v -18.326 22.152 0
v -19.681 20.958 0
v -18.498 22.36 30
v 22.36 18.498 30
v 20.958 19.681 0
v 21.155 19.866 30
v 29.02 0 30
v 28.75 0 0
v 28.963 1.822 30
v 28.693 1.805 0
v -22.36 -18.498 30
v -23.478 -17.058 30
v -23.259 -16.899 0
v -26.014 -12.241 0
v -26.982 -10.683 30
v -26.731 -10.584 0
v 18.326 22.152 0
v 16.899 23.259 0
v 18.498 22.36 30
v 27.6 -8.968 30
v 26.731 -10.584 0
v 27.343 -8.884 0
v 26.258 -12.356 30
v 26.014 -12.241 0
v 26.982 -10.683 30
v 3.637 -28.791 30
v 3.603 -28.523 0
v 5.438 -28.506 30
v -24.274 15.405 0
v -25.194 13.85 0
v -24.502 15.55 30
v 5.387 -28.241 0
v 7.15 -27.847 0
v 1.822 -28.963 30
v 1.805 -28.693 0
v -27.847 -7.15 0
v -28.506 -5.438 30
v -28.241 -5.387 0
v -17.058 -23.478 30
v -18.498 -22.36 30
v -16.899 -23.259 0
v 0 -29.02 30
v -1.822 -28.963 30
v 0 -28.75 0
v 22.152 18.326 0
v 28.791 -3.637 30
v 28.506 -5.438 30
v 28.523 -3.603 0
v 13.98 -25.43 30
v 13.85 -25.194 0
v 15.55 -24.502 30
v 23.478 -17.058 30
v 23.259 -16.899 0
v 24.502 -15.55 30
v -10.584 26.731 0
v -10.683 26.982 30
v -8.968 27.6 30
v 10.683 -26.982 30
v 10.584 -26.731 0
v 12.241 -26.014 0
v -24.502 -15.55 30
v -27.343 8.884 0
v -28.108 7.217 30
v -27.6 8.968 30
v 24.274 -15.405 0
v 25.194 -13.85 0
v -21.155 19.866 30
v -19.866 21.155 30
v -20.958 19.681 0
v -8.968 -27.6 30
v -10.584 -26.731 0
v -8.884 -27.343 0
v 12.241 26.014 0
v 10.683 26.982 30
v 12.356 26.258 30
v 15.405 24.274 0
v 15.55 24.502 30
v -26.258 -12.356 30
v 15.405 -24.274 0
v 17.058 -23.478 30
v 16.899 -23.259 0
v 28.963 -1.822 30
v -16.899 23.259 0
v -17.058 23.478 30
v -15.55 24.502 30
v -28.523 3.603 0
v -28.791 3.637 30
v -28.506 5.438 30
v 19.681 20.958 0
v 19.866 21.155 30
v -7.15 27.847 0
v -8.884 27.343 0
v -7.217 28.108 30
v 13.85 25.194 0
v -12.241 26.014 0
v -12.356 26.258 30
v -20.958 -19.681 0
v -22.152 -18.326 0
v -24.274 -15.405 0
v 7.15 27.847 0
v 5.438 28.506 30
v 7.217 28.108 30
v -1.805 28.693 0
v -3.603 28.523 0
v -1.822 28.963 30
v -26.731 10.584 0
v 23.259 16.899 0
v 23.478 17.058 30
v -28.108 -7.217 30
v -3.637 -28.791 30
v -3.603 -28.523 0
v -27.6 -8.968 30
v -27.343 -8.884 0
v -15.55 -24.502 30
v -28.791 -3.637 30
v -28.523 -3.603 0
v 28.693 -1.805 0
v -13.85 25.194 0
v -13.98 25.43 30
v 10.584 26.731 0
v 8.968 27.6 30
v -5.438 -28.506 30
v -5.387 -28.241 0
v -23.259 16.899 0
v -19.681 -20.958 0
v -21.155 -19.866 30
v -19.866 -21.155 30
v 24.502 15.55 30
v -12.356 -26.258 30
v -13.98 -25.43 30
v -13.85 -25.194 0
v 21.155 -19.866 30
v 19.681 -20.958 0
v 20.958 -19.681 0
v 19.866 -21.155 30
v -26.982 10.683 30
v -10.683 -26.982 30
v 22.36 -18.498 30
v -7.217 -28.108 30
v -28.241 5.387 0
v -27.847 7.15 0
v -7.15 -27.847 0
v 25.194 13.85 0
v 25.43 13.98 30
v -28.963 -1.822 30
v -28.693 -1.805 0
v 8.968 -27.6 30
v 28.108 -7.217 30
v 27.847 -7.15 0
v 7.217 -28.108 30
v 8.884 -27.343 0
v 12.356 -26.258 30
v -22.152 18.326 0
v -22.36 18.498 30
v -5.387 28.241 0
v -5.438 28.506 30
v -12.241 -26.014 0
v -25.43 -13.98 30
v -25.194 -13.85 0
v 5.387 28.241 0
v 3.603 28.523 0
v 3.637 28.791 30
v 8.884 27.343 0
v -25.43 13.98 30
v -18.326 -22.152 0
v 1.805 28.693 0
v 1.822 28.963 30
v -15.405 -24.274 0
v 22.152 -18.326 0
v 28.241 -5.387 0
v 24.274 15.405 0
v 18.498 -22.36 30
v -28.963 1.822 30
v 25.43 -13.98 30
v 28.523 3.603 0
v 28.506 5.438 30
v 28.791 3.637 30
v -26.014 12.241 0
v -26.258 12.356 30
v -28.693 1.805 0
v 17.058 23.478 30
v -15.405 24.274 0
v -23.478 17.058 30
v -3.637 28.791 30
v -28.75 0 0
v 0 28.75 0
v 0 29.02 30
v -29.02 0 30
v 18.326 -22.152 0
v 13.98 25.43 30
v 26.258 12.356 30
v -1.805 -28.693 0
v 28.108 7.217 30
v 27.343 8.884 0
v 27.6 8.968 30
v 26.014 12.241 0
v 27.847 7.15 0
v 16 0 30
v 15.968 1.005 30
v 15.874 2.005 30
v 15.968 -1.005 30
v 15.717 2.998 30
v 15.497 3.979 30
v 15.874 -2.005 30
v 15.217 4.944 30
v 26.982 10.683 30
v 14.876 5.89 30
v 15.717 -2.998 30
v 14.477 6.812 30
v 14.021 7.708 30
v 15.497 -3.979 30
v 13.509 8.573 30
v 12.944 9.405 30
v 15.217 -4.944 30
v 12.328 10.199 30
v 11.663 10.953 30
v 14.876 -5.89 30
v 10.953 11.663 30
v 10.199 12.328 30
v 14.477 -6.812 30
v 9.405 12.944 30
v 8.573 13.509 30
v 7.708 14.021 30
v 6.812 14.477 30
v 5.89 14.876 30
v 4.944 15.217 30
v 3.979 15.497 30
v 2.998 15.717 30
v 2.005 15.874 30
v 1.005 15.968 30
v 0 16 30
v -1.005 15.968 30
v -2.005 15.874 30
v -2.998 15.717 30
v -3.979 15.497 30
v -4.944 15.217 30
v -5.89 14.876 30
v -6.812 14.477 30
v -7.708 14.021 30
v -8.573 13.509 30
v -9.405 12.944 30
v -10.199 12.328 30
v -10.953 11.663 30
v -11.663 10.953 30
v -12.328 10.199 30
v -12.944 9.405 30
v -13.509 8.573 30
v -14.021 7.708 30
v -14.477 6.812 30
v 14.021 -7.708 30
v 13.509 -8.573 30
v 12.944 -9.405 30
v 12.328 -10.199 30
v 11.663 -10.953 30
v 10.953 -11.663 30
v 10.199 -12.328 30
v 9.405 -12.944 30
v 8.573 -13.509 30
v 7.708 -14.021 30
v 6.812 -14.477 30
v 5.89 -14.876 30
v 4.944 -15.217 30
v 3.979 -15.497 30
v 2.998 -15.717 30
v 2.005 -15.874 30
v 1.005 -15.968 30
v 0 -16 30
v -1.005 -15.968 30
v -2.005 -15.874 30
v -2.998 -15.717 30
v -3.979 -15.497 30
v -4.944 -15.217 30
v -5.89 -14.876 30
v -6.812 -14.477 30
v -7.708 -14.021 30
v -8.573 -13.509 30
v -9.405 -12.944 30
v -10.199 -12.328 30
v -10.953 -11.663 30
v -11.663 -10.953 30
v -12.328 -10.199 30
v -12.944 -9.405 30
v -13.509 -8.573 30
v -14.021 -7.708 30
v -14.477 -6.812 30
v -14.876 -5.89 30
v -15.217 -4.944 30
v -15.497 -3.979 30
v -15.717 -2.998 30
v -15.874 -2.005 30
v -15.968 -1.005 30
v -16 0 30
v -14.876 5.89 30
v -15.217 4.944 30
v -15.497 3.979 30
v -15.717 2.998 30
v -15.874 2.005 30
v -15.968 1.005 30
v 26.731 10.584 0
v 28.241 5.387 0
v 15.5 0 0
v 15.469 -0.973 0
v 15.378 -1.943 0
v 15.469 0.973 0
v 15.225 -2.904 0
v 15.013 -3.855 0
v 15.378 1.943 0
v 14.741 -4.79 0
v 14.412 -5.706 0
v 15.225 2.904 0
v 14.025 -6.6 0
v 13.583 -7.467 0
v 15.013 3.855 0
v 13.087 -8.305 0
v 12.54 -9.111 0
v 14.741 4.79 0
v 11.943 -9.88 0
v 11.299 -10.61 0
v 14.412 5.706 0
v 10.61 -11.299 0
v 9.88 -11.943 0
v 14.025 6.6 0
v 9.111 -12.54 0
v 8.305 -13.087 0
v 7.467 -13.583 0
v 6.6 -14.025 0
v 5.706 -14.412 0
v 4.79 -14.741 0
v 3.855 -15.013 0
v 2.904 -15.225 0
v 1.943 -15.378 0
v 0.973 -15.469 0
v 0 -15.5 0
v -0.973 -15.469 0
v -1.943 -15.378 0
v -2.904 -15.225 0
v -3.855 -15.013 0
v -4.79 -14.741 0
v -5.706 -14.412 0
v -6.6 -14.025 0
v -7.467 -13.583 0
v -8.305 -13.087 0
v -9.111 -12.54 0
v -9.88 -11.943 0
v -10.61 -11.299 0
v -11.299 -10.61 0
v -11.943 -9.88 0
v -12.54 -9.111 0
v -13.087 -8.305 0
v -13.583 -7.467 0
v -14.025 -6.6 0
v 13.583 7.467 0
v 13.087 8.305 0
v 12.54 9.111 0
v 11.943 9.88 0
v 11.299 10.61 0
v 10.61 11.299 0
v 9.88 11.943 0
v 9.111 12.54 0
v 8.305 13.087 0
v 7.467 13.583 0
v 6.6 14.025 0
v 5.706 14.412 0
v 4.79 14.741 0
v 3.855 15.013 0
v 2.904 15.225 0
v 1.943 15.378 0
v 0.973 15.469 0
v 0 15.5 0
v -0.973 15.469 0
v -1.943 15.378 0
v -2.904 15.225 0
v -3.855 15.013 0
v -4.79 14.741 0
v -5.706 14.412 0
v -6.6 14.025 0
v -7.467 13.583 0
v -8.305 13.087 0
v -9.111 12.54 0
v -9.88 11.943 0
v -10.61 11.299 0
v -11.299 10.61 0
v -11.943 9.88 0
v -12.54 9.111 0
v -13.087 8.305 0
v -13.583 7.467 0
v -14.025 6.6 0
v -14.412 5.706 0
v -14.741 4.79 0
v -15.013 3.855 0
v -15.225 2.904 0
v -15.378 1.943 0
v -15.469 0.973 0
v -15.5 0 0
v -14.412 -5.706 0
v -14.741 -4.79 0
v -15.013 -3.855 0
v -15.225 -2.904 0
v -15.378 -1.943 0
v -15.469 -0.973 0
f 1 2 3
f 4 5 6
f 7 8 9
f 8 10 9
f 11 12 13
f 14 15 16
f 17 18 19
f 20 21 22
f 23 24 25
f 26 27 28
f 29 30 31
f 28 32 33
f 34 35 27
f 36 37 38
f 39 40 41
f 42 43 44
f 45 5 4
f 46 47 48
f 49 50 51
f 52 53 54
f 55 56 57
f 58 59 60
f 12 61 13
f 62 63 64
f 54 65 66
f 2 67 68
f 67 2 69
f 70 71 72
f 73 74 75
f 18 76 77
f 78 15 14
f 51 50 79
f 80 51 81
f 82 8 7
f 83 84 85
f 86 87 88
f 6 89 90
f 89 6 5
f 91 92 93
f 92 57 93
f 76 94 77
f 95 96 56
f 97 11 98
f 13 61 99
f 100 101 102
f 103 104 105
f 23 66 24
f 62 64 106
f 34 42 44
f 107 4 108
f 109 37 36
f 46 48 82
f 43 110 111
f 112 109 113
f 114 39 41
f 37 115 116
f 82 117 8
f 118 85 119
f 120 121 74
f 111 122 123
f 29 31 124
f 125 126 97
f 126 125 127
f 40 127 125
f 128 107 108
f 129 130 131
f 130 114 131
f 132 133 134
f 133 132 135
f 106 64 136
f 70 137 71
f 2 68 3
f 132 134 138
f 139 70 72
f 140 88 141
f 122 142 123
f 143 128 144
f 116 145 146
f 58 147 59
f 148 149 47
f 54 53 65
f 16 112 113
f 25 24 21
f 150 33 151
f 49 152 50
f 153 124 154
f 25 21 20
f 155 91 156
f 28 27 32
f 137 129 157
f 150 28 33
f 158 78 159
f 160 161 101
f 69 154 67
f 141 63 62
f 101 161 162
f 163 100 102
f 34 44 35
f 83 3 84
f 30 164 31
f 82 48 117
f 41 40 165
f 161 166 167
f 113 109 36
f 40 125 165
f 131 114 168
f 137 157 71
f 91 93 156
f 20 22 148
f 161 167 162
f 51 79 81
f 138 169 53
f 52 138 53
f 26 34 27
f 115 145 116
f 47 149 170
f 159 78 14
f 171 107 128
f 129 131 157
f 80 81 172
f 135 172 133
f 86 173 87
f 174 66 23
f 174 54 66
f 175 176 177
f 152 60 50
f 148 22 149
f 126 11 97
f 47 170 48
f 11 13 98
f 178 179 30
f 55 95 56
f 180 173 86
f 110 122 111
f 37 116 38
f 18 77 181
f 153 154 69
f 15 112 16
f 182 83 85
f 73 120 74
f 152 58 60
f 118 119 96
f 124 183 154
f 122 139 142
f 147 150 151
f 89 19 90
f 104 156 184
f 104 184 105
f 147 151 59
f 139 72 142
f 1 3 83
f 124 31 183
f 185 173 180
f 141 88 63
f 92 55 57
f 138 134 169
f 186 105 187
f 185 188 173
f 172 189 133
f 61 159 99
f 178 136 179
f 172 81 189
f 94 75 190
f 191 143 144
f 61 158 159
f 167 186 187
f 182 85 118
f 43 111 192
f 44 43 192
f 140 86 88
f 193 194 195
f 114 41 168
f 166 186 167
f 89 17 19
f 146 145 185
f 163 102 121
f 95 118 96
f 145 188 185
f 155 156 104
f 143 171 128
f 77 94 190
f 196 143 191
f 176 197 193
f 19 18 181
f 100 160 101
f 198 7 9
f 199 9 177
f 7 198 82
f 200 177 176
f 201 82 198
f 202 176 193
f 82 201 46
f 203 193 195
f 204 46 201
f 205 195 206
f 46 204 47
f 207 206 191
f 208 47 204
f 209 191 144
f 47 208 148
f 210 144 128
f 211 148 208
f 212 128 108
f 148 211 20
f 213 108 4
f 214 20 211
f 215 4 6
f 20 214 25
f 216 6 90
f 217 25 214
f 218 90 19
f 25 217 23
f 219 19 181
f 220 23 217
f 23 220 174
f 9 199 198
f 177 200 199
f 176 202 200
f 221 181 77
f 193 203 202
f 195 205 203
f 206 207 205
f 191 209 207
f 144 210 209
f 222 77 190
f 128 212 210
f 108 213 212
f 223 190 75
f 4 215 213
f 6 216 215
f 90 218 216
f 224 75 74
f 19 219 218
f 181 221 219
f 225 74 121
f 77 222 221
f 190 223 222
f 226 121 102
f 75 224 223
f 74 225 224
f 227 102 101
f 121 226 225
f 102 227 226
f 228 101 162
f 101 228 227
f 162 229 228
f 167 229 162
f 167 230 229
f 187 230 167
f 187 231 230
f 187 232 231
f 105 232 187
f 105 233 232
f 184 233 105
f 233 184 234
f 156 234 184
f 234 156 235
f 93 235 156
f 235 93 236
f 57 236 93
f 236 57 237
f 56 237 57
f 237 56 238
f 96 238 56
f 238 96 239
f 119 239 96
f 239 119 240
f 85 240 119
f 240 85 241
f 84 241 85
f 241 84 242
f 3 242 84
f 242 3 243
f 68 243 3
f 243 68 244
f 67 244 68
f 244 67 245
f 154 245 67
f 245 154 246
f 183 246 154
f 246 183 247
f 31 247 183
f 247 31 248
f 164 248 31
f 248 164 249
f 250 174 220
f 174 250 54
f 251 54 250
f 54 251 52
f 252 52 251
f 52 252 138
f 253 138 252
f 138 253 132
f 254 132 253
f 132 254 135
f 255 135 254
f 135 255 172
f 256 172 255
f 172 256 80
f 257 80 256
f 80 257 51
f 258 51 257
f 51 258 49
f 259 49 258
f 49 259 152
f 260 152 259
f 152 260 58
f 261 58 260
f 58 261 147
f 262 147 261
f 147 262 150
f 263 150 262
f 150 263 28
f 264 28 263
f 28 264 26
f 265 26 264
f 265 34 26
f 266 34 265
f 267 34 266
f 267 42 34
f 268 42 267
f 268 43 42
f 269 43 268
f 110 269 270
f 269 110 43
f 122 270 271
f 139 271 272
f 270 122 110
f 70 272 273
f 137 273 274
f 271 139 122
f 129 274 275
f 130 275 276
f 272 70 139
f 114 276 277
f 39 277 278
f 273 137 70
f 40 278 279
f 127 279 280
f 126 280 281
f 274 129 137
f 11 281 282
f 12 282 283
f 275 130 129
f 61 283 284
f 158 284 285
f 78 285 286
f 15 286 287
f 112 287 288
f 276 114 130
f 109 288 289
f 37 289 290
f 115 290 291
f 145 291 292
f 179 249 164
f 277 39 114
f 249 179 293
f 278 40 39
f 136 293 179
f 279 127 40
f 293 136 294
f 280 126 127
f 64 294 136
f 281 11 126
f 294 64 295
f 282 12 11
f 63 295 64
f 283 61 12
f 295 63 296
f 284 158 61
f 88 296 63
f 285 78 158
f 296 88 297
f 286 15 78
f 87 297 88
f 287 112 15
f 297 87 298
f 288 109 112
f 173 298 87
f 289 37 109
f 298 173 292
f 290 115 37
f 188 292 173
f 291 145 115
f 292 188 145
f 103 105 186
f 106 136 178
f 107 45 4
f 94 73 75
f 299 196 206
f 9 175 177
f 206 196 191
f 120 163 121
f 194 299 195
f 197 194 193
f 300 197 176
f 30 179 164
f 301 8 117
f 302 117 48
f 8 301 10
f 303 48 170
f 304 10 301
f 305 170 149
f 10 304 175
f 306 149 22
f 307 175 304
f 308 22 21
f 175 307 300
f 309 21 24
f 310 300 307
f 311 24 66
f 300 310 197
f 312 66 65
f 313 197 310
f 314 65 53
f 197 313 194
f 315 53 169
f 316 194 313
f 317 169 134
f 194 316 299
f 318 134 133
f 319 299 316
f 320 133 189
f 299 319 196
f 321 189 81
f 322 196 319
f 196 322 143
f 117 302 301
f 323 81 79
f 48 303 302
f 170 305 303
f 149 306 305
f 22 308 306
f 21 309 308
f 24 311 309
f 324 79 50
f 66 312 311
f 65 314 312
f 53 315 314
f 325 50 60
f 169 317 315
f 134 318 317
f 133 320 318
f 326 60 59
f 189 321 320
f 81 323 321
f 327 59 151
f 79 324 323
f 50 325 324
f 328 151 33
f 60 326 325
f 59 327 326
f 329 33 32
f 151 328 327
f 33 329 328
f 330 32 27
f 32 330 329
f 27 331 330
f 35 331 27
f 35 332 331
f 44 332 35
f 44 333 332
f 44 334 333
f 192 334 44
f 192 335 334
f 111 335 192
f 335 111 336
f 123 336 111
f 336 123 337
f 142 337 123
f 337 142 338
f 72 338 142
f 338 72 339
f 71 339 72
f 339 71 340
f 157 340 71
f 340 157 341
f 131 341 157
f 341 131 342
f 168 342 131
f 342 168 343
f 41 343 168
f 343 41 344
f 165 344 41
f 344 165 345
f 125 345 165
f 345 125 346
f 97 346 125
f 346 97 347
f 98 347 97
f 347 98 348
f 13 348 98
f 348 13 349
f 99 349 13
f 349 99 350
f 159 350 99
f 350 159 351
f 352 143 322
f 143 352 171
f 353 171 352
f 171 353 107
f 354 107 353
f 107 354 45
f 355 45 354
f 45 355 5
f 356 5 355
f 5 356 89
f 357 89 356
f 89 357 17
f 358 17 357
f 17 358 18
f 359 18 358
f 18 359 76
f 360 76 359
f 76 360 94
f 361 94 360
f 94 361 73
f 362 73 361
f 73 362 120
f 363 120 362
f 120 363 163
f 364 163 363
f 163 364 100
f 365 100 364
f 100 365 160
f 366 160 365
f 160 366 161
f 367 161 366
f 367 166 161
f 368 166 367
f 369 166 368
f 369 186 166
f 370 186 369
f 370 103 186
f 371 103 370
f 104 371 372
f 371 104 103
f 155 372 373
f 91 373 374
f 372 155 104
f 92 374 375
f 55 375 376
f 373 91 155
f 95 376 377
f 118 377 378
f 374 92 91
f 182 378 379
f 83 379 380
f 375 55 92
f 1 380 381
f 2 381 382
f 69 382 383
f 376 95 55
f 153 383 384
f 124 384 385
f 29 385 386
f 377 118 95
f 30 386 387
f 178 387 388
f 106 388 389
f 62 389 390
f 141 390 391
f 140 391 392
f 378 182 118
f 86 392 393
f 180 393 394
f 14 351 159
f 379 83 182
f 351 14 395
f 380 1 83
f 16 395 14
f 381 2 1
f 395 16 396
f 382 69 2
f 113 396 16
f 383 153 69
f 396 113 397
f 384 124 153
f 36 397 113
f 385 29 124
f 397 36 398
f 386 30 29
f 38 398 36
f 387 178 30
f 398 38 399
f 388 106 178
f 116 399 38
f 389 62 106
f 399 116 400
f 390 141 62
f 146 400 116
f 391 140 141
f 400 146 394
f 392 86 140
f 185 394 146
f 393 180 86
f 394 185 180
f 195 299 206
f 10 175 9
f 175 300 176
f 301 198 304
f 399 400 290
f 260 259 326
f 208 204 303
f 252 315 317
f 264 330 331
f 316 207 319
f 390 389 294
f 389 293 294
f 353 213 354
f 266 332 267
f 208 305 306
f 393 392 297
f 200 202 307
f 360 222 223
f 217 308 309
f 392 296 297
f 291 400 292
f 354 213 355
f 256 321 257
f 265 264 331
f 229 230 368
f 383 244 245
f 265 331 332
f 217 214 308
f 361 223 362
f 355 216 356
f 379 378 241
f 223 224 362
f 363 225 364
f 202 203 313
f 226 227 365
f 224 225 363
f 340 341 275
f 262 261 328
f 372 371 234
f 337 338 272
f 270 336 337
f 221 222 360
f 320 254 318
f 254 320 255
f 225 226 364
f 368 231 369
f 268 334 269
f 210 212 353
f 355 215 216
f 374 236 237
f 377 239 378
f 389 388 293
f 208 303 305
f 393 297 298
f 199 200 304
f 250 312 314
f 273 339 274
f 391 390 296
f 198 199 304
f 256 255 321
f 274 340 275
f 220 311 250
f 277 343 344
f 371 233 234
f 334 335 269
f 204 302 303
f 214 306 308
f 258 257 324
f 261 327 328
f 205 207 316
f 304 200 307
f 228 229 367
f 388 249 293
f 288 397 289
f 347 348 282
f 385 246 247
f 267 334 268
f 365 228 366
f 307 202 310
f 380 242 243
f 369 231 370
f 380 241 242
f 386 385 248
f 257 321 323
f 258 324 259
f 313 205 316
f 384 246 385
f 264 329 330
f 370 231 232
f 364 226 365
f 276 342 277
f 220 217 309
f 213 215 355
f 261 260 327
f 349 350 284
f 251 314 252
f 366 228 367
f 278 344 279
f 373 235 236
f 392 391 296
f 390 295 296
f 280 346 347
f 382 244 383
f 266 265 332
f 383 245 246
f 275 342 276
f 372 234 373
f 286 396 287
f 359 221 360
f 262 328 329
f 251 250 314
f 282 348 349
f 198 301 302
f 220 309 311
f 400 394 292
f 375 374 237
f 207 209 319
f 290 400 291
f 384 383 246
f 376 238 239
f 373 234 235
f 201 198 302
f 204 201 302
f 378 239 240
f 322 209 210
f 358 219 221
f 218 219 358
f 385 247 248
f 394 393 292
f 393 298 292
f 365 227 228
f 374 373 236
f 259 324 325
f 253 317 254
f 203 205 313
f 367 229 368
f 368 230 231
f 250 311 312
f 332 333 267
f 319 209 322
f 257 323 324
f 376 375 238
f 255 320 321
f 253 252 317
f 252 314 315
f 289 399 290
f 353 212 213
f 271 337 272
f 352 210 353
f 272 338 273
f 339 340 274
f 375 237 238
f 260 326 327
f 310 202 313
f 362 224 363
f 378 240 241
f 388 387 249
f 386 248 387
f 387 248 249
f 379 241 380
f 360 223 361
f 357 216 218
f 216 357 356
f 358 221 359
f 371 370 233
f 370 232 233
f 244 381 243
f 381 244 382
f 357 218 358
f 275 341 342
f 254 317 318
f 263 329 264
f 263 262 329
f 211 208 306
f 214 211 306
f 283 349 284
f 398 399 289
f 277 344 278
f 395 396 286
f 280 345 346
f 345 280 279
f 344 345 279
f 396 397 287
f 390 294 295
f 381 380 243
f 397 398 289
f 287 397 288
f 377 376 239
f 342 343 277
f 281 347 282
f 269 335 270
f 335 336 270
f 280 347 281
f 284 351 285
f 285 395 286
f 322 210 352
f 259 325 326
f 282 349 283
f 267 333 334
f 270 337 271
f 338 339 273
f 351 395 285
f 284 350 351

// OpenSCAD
outerDiameter1 = 57.5;
outerDiameter2 = 58.04;

innerDiameter1 = 31.0;
innerDiameter2 = 32.0;

height = 30;

module tube(h, od1, od2, id1, id2)
{
    difference()
    {
        cylinder(h=h, d1=od1, d2=od2, center=false, $fn=100);
        cylinder(h=h, d1=id1, d2=id2, center=false, $fn=100);
    }
}

tube(height, outerDiameter1, outerDiameter2, innerDiameter1,innerDiameter2);
